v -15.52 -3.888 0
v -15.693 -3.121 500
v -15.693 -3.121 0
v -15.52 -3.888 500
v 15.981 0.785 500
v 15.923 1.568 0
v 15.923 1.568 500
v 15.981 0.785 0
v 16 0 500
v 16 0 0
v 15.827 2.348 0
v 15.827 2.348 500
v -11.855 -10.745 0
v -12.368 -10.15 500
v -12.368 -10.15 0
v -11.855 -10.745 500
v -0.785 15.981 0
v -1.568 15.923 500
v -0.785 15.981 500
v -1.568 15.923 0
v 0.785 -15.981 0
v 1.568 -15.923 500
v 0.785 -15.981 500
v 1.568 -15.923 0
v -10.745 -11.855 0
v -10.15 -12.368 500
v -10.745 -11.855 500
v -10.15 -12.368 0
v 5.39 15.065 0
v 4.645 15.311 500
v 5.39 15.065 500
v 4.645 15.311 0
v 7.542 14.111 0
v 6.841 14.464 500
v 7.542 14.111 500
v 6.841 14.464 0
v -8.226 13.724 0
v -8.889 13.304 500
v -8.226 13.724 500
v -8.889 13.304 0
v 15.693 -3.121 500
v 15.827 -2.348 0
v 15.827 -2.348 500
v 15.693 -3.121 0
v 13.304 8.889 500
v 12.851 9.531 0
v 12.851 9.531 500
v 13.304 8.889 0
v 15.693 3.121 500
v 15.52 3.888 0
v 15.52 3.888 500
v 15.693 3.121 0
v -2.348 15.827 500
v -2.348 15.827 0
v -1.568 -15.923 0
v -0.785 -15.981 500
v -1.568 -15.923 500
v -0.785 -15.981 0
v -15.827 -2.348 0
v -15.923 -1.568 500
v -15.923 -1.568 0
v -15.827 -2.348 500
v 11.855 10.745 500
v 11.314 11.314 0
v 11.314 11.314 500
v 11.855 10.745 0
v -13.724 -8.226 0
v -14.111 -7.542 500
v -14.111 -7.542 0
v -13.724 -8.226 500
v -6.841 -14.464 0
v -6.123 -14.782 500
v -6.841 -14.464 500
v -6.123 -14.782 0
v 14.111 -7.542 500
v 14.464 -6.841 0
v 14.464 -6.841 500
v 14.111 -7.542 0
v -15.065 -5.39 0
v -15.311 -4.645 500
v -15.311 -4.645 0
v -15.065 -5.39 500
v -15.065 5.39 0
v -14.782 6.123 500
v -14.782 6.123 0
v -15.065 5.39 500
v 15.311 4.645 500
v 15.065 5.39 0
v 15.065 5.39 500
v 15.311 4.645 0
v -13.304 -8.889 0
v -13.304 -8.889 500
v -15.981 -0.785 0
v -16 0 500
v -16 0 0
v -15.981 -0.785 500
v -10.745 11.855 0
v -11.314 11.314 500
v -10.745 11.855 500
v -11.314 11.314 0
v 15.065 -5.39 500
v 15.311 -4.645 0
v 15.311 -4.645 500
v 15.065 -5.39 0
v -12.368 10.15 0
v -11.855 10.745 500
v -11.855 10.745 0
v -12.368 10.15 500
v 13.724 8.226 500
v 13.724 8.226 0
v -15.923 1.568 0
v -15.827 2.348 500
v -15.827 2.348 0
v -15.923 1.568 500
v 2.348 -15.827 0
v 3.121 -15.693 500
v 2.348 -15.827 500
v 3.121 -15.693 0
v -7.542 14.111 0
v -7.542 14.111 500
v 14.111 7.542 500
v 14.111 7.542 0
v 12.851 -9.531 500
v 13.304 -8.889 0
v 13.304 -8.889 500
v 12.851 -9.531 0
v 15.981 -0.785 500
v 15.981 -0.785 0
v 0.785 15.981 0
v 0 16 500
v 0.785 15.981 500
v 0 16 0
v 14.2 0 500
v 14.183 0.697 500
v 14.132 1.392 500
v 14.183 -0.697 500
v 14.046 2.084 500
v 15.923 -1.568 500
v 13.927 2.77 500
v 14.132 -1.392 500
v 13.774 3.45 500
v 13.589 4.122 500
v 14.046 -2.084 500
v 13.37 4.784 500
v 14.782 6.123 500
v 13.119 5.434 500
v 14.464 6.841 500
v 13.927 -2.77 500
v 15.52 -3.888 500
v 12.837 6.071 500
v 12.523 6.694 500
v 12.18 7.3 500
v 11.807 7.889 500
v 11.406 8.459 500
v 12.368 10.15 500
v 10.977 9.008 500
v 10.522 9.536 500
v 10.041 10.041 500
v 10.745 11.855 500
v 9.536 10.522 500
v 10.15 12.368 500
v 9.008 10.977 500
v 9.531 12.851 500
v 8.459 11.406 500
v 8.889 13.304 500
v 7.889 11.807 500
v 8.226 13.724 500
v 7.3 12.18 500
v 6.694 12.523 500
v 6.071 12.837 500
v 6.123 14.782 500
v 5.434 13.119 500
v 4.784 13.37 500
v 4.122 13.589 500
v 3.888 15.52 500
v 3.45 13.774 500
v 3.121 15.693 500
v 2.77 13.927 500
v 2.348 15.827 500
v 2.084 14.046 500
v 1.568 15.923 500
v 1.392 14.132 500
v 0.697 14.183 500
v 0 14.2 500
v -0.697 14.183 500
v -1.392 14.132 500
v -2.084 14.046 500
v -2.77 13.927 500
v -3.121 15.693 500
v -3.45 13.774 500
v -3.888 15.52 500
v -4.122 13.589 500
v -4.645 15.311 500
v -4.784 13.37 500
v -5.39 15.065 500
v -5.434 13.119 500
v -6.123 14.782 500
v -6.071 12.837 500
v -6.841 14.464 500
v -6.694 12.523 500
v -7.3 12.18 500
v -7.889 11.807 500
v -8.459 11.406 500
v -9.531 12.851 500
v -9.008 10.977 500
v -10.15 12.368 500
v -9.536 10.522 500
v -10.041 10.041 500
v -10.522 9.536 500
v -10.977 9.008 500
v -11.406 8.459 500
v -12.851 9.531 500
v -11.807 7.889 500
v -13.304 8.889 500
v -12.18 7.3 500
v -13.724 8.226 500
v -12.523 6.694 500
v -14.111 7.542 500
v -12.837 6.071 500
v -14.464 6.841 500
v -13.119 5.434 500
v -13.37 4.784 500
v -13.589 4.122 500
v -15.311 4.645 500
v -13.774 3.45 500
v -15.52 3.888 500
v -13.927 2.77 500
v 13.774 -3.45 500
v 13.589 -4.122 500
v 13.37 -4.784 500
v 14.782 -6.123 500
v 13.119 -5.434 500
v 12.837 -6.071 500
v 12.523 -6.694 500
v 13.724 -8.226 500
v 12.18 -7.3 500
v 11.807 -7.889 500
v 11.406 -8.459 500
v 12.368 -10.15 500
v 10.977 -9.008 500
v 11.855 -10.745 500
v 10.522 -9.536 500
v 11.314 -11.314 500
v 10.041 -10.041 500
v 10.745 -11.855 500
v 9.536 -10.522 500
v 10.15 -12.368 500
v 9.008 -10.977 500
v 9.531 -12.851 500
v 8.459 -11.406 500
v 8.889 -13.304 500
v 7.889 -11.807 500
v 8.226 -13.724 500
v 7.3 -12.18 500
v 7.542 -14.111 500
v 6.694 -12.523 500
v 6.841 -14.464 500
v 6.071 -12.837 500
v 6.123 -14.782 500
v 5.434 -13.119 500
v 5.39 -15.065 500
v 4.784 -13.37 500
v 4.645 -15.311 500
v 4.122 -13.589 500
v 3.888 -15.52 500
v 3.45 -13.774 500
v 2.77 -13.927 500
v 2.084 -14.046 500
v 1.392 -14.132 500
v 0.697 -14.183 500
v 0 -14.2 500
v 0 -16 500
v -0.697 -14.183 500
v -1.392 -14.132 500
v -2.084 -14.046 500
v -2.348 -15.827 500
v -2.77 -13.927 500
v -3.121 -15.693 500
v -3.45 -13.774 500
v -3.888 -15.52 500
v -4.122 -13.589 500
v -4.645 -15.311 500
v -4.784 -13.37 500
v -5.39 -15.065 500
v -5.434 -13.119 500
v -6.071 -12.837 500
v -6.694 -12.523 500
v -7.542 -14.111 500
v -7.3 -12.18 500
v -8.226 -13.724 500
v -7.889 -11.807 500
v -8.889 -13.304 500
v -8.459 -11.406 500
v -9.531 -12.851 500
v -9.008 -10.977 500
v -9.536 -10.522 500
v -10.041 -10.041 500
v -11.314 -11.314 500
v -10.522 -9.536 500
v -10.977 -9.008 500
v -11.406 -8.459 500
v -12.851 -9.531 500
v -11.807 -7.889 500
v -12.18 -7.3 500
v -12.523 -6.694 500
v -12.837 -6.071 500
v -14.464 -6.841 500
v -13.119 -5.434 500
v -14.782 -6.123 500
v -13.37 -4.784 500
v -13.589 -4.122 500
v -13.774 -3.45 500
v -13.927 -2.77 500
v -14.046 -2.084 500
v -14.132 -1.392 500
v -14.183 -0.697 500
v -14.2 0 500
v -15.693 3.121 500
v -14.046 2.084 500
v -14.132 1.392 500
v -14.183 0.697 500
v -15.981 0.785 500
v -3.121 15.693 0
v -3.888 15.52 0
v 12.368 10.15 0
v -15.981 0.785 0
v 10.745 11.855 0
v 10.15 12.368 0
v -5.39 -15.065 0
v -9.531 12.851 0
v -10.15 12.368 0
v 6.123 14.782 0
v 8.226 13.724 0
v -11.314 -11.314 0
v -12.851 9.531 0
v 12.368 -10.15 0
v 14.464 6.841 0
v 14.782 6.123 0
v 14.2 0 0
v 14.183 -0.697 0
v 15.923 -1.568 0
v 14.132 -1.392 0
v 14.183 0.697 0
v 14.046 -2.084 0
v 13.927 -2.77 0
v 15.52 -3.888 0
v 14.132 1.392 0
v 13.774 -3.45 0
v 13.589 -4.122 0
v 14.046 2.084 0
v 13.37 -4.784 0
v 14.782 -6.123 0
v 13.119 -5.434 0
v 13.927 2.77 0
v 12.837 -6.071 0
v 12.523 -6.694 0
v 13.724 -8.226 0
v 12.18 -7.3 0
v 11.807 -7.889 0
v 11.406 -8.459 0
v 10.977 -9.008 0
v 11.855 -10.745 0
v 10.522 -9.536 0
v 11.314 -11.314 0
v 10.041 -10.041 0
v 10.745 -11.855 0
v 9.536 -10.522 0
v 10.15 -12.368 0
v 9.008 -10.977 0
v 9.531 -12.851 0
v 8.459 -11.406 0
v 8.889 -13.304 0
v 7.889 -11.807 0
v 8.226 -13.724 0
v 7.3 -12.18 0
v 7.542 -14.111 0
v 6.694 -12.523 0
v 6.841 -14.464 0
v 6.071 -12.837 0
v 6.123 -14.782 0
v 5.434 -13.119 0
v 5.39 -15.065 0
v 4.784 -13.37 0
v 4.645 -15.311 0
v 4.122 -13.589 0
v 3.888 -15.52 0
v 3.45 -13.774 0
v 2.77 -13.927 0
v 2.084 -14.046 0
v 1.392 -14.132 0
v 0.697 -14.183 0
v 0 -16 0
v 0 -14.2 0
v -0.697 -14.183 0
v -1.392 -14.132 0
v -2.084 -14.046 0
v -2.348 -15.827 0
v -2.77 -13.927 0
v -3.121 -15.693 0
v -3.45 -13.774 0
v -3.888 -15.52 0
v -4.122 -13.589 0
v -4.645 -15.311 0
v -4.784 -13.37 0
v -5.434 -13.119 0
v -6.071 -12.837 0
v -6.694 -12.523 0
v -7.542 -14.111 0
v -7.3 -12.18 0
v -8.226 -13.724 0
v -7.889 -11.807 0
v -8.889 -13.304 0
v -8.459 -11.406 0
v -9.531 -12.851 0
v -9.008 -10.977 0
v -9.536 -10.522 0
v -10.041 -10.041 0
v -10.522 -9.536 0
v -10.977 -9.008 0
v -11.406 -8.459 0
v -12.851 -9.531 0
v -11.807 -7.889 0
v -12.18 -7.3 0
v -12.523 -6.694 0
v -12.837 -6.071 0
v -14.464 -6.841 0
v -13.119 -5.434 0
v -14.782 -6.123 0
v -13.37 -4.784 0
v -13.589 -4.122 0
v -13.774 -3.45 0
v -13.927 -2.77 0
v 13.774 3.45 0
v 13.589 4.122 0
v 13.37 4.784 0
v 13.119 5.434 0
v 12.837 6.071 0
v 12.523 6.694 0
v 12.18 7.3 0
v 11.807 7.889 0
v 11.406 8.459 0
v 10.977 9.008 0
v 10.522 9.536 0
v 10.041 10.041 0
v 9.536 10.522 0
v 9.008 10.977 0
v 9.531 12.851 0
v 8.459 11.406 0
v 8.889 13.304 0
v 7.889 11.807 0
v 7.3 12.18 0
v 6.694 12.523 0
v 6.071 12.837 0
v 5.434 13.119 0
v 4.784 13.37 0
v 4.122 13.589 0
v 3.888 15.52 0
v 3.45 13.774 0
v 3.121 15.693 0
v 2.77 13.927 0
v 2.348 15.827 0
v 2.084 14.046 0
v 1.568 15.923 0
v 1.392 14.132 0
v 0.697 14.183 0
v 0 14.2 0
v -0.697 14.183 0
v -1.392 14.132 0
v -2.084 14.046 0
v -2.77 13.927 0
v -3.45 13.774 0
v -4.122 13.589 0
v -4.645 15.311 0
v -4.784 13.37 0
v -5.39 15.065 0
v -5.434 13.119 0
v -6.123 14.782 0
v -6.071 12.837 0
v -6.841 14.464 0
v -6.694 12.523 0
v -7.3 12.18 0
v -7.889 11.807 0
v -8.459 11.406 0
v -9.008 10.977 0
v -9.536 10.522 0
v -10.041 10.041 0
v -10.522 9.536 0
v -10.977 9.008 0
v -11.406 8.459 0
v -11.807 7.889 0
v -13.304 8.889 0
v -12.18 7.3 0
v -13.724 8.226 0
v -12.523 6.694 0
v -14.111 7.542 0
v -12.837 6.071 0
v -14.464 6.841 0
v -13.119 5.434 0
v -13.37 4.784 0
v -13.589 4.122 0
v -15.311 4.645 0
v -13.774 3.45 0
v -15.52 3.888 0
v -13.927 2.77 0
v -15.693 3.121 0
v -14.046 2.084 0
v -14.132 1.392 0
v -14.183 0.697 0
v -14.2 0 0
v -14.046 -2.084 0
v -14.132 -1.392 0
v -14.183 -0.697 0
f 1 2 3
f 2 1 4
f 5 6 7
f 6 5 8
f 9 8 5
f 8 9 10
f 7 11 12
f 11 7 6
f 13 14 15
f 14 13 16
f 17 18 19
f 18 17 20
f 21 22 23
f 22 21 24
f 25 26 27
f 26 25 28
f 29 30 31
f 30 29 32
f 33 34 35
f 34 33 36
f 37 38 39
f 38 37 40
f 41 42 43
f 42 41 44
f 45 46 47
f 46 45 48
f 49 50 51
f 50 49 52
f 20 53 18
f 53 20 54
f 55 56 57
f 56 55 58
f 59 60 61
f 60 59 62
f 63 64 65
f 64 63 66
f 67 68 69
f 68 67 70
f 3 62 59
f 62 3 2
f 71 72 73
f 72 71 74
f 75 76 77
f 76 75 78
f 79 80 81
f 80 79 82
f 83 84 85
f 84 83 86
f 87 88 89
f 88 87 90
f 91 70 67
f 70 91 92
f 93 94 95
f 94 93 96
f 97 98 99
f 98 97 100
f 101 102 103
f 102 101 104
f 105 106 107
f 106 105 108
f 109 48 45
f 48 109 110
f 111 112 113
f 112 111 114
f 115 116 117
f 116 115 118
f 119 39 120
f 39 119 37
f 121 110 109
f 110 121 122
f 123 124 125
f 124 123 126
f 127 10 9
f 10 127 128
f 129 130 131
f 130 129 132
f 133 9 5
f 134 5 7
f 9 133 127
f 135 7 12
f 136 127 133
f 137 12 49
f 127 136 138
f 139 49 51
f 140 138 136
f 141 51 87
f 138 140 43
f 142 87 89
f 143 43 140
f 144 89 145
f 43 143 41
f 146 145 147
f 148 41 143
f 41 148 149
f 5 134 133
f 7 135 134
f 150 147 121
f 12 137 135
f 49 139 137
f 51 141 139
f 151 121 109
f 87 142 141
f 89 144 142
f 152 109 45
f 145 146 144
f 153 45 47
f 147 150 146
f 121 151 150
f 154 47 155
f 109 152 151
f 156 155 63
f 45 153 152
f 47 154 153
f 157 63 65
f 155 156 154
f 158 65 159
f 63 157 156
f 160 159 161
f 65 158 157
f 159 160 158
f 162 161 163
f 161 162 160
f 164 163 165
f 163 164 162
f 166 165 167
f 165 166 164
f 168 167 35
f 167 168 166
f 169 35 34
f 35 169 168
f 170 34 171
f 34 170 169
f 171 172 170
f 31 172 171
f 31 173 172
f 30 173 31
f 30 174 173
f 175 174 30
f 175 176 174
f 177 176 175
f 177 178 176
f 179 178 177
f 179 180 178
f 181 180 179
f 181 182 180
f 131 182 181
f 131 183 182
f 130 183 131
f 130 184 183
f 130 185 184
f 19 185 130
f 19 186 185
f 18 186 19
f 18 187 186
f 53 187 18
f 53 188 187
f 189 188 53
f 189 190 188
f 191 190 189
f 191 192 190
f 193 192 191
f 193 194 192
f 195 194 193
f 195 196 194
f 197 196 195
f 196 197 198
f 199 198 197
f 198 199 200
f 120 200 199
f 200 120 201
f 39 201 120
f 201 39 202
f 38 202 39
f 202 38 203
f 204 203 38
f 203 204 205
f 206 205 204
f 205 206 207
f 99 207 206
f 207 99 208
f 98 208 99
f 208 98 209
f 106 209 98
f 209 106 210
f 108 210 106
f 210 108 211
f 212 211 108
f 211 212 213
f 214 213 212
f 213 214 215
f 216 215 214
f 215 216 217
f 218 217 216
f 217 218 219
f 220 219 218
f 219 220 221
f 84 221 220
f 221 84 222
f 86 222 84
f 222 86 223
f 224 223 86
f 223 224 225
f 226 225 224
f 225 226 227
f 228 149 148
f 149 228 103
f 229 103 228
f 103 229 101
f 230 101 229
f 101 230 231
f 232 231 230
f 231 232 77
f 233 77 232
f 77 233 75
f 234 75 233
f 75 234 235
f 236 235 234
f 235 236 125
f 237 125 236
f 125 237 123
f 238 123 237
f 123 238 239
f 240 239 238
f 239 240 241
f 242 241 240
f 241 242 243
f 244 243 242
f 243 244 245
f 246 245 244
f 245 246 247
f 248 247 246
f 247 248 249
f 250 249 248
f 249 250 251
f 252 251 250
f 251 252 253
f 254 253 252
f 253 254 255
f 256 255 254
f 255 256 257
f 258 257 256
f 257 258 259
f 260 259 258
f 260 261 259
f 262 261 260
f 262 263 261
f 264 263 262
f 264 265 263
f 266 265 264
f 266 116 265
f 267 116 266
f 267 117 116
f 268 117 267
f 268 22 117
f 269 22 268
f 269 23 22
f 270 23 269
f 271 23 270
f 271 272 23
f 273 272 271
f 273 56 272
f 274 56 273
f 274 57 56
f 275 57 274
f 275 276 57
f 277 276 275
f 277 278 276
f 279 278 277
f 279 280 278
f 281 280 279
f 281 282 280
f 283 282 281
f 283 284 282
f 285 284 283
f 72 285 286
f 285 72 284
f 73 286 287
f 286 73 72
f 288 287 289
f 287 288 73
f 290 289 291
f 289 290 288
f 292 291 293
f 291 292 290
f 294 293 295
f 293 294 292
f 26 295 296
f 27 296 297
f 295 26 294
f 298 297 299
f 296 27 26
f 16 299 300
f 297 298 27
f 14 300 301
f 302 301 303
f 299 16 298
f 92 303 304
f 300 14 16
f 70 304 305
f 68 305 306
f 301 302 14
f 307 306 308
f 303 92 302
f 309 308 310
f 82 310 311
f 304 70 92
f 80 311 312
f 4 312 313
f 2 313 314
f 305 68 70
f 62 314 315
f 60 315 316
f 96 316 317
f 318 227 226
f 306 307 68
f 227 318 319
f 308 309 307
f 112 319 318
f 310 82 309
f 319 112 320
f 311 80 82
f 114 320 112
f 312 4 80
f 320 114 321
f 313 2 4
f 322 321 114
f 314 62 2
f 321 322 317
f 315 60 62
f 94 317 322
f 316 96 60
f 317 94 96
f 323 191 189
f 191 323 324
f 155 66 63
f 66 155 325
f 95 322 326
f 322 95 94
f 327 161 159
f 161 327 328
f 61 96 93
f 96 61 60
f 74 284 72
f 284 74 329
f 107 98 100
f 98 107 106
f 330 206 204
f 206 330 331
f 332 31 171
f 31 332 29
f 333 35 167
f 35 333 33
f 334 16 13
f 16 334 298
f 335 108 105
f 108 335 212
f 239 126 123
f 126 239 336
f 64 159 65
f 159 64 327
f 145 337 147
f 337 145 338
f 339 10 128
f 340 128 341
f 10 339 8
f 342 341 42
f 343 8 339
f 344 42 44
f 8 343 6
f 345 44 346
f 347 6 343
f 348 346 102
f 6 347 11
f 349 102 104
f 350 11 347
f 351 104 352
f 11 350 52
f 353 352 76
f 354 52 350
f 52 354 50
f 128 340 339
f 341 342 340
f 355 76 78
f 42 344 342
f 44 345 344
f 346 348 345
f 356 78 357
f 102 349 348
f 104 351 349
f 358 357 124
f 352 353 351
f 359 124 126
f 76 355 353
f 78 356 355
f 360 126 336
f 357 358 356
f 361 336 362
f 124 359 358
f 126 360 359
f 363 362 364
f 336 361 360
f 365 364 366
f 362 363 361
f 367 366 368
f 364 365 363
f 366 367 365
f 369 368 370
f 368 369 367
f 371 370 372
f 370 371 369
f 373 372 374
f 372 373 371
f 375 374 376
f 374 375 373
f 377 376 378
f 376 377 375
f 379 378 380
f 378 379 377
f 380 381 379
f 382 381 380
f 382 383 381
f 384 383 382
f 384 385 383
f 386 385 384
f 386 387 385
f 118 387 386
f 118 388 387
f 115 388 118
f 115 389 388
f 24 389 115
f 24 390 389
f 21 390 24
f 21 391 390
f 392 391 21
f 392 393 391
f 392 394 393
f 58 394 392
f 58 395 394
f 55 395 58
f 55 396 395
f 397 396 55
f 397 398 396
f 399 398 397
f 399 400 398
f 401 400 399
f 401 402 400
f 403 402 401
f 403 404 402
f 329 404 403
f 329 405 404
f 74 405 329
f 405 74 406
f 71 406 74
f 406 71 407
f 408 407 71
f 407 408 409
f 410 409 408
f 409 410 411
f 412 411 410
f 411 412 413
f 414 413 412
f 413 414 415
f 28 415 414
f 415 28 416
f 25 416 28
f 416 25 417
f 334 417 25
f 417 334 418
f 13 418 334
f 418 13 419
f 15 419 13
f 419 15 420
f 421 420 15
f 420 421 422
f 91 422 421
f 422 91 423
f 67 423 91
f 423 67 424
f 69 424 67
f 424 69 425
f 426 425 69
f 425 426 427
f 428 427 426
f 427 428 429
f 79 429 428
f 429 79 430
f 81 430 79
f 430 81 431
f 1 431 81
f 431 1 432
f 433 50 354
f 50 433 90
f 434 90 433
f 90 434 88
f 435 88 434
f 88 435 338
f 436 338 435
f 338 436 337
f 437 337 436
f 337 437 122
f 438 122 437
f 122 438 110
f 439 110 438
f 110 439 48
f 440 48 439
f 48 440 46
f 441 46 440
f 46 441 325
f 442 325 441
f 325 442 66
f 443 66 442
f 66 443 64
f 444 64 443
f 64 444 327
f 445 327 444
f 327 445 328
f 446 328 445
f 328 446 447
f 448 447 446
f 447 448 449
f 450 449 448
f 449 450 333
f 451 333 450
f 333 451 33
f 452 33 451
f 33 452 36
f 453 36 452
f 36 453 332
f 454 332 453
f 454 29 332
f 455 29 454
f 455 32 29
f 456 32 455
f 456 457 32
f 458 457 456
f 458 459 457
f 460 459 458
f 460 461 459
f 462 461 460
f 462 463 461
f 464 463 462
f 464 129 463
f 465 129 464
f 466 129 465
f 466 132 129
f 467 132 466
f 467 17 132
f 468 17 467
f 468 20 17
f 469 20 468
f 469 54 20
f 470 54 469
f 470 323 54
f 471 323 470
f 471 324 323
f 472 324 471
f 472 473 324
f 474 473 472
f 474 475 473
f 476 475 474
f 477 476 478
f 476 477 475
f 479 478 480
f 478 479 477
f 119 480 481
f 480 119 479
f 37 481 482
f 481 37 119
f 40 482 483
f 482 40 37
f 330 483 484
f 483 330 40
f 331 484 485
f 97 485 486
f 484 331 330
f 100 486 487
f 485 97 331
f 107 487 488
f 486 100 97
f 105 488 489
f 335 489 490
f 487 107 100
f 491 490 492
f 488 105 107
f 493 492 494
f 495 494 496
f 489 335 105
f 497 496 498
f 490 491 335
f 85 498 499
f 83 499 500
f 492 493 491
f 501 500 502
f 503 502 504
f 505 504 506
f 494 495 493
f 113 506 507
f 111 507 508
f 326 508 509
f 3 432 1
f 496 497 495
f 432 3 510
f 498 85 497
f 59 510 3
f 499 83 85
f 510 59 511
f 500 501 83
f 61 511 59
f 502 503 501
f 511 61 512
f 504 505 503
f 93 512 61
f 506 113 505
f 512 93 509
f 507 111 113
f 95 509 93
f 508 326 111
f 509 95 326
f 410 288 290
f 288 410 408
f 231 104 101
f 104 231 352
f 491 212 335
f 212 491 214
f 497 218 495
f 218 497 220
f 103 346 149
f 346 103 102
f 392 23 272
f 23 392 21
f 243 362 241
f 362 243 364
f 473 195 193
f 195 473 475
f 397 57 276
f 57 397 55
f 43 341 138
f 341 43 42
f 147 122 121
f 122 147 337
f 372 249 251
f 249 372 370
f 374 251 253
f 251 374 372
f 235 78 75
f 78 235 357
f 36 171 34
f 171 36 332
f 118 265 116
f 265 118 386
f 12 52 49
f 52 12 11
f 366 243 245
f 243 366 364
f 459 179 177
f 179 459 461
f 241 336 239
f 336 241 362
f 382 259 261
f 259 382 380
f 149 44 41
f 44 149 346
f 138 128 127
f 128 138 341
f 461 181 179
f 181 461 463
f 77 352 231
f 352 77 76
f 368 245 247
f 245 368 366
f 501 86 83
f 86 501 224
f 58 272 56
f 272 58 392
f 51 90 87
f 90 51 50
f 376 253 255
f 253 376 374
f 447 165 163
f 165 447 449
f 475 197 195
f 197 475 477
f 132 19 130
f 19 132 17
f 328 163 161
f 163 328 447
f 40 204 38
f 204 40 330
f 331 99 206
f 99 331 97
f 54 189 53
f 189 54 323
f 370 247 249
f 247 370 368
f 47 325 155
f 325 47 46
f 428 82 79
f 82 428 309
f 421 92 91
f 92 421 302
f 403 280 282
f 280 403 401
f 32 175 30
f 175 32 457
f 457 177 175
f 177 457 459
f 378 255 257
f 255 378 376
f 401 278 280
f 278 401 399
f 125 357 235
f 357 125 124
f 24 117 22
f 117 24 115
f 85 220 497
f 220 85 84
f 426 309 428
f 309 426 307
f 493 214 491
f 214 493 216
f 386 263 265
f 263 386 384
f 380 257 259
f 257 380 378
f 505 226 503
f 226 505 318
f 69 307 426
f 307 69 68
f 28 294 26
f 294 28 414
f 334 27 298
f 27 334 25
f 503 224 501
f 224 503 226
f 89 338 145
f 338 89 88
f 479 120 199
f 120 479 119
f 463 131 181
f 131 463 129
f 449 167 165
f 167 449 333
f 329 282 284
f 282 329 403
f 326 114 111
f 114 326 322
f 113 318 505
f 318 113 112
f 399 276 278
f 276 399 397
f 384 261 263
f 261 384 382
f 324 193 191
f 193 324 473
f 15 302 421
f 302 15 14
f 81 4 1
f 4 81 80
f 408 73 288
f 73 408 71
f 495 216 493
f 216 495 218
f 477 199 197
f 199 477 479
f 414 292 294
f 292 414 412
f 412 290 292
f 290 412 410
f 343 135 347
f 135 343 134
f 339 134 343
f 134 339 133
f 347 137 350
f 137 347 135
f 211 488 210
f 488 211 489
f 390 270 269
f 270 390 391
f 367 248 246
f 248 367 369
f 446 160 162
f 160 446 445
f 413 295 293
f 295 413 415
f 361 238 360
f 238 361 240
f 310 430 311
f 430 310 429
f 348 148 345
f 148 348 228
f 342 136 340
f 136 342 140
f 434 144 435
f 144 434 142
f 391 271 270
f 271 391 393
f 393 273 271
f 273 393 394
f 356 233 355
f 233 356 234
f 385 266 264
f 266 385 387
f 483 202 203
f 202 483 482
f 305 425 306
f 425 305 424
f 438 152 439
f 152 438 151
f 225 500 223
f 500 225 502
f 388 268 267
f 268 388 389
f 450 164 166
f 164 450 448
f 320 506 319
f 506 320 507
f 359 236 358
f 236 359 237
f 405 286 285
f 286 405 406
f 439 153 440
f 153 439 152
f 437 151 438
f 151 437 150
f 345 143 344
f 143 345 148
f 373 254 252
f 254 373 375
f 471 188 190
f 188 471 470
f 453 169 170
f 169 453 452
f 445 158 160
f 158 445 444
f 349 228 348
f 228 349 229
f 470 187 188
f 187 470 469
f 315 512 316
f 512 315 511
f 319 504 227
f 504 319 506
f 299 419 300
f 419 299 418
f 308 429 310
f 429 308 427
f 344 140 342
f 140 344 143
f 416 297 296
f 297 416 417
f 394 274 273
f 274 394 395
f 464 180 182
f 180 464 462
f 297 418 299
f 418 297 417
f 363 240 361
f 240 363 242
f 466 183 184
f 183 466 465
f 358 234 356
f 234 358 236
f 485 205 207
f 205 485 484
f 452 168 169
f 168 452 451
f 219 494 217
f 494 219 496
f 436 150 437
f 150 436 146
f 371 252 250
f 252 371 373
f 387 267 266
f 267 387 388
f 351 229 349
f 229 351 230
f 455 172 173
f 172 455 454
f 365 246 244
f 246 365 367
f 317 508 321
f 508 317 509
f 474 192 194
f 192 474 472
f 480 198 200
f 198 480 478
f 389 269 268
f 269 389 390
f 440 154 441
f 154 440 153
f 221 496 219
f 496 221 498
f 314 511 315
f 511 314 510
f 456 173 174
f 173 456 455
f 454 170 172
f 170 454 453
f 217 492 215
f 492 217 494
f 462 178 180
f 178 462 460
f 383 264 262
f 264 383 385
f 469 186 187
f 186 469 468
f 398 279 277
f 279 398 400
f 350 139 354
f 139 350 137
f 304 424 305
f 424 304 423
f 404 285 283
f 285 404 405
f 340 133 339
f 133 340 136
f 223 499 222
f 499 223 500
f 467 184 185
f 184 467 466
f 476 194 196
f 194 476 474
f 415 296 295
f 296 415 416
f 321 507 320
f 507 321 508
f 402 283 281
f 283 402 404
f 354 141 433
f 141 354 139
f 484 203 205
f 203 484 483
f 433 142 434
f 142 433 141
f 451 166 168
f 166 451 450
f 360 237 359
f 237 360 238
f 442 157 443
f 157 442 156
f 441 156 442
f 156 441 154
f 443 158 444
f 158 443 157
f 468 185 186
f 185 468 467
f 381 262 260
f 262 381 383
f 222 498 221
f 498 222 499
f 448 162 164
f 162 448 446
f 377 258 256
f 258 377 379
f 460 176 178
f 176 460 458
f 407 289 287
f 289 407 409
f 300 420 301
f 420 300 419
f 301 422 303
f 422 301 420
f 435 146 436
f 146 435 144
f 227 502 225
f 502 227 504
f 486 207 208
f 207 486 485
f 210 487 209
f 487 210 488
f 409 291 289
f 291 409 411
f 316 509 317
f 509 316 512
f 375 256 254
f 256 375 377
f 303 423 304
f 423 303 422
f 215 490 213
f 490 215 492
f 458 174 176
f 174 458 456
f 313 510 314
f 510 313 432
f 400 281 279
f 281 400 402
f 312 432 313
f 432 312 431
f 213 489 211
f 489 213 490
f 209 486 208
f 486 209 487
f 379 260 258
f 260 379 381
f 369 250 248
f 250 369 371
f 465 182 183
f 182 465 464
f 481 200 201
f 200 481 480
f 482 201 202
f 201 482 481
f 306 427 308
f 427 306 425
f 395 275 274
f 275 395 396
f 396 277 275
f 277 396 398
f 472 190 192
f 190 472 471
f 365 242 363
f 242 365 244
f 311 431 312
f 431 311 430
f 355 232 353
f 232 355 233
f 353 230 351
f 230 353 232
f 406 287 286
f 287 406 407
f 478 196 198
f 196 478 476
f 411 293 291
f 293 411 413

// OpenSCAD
$fn = 128;

// HT pipe parameters (approximate for HT 32)
pipe_length = 500;          // mm
outer_diameter = 32;        // mm (nominal)
wall_thickness = 1.8;       // mm (typical for HT 32, approximate)

inner_diameter = outer_diameter - 2 * wall_thickness;

module ht_pipe(od, id, len) {
    difference() {
        cylinder(h = len, d = od);
        translate([0, 0, -0.1])
            cylinder(h = len + 0.2, d = id);
    }
}

ht_pipe(outer_diameter, inner_diameter, pipe_length);
